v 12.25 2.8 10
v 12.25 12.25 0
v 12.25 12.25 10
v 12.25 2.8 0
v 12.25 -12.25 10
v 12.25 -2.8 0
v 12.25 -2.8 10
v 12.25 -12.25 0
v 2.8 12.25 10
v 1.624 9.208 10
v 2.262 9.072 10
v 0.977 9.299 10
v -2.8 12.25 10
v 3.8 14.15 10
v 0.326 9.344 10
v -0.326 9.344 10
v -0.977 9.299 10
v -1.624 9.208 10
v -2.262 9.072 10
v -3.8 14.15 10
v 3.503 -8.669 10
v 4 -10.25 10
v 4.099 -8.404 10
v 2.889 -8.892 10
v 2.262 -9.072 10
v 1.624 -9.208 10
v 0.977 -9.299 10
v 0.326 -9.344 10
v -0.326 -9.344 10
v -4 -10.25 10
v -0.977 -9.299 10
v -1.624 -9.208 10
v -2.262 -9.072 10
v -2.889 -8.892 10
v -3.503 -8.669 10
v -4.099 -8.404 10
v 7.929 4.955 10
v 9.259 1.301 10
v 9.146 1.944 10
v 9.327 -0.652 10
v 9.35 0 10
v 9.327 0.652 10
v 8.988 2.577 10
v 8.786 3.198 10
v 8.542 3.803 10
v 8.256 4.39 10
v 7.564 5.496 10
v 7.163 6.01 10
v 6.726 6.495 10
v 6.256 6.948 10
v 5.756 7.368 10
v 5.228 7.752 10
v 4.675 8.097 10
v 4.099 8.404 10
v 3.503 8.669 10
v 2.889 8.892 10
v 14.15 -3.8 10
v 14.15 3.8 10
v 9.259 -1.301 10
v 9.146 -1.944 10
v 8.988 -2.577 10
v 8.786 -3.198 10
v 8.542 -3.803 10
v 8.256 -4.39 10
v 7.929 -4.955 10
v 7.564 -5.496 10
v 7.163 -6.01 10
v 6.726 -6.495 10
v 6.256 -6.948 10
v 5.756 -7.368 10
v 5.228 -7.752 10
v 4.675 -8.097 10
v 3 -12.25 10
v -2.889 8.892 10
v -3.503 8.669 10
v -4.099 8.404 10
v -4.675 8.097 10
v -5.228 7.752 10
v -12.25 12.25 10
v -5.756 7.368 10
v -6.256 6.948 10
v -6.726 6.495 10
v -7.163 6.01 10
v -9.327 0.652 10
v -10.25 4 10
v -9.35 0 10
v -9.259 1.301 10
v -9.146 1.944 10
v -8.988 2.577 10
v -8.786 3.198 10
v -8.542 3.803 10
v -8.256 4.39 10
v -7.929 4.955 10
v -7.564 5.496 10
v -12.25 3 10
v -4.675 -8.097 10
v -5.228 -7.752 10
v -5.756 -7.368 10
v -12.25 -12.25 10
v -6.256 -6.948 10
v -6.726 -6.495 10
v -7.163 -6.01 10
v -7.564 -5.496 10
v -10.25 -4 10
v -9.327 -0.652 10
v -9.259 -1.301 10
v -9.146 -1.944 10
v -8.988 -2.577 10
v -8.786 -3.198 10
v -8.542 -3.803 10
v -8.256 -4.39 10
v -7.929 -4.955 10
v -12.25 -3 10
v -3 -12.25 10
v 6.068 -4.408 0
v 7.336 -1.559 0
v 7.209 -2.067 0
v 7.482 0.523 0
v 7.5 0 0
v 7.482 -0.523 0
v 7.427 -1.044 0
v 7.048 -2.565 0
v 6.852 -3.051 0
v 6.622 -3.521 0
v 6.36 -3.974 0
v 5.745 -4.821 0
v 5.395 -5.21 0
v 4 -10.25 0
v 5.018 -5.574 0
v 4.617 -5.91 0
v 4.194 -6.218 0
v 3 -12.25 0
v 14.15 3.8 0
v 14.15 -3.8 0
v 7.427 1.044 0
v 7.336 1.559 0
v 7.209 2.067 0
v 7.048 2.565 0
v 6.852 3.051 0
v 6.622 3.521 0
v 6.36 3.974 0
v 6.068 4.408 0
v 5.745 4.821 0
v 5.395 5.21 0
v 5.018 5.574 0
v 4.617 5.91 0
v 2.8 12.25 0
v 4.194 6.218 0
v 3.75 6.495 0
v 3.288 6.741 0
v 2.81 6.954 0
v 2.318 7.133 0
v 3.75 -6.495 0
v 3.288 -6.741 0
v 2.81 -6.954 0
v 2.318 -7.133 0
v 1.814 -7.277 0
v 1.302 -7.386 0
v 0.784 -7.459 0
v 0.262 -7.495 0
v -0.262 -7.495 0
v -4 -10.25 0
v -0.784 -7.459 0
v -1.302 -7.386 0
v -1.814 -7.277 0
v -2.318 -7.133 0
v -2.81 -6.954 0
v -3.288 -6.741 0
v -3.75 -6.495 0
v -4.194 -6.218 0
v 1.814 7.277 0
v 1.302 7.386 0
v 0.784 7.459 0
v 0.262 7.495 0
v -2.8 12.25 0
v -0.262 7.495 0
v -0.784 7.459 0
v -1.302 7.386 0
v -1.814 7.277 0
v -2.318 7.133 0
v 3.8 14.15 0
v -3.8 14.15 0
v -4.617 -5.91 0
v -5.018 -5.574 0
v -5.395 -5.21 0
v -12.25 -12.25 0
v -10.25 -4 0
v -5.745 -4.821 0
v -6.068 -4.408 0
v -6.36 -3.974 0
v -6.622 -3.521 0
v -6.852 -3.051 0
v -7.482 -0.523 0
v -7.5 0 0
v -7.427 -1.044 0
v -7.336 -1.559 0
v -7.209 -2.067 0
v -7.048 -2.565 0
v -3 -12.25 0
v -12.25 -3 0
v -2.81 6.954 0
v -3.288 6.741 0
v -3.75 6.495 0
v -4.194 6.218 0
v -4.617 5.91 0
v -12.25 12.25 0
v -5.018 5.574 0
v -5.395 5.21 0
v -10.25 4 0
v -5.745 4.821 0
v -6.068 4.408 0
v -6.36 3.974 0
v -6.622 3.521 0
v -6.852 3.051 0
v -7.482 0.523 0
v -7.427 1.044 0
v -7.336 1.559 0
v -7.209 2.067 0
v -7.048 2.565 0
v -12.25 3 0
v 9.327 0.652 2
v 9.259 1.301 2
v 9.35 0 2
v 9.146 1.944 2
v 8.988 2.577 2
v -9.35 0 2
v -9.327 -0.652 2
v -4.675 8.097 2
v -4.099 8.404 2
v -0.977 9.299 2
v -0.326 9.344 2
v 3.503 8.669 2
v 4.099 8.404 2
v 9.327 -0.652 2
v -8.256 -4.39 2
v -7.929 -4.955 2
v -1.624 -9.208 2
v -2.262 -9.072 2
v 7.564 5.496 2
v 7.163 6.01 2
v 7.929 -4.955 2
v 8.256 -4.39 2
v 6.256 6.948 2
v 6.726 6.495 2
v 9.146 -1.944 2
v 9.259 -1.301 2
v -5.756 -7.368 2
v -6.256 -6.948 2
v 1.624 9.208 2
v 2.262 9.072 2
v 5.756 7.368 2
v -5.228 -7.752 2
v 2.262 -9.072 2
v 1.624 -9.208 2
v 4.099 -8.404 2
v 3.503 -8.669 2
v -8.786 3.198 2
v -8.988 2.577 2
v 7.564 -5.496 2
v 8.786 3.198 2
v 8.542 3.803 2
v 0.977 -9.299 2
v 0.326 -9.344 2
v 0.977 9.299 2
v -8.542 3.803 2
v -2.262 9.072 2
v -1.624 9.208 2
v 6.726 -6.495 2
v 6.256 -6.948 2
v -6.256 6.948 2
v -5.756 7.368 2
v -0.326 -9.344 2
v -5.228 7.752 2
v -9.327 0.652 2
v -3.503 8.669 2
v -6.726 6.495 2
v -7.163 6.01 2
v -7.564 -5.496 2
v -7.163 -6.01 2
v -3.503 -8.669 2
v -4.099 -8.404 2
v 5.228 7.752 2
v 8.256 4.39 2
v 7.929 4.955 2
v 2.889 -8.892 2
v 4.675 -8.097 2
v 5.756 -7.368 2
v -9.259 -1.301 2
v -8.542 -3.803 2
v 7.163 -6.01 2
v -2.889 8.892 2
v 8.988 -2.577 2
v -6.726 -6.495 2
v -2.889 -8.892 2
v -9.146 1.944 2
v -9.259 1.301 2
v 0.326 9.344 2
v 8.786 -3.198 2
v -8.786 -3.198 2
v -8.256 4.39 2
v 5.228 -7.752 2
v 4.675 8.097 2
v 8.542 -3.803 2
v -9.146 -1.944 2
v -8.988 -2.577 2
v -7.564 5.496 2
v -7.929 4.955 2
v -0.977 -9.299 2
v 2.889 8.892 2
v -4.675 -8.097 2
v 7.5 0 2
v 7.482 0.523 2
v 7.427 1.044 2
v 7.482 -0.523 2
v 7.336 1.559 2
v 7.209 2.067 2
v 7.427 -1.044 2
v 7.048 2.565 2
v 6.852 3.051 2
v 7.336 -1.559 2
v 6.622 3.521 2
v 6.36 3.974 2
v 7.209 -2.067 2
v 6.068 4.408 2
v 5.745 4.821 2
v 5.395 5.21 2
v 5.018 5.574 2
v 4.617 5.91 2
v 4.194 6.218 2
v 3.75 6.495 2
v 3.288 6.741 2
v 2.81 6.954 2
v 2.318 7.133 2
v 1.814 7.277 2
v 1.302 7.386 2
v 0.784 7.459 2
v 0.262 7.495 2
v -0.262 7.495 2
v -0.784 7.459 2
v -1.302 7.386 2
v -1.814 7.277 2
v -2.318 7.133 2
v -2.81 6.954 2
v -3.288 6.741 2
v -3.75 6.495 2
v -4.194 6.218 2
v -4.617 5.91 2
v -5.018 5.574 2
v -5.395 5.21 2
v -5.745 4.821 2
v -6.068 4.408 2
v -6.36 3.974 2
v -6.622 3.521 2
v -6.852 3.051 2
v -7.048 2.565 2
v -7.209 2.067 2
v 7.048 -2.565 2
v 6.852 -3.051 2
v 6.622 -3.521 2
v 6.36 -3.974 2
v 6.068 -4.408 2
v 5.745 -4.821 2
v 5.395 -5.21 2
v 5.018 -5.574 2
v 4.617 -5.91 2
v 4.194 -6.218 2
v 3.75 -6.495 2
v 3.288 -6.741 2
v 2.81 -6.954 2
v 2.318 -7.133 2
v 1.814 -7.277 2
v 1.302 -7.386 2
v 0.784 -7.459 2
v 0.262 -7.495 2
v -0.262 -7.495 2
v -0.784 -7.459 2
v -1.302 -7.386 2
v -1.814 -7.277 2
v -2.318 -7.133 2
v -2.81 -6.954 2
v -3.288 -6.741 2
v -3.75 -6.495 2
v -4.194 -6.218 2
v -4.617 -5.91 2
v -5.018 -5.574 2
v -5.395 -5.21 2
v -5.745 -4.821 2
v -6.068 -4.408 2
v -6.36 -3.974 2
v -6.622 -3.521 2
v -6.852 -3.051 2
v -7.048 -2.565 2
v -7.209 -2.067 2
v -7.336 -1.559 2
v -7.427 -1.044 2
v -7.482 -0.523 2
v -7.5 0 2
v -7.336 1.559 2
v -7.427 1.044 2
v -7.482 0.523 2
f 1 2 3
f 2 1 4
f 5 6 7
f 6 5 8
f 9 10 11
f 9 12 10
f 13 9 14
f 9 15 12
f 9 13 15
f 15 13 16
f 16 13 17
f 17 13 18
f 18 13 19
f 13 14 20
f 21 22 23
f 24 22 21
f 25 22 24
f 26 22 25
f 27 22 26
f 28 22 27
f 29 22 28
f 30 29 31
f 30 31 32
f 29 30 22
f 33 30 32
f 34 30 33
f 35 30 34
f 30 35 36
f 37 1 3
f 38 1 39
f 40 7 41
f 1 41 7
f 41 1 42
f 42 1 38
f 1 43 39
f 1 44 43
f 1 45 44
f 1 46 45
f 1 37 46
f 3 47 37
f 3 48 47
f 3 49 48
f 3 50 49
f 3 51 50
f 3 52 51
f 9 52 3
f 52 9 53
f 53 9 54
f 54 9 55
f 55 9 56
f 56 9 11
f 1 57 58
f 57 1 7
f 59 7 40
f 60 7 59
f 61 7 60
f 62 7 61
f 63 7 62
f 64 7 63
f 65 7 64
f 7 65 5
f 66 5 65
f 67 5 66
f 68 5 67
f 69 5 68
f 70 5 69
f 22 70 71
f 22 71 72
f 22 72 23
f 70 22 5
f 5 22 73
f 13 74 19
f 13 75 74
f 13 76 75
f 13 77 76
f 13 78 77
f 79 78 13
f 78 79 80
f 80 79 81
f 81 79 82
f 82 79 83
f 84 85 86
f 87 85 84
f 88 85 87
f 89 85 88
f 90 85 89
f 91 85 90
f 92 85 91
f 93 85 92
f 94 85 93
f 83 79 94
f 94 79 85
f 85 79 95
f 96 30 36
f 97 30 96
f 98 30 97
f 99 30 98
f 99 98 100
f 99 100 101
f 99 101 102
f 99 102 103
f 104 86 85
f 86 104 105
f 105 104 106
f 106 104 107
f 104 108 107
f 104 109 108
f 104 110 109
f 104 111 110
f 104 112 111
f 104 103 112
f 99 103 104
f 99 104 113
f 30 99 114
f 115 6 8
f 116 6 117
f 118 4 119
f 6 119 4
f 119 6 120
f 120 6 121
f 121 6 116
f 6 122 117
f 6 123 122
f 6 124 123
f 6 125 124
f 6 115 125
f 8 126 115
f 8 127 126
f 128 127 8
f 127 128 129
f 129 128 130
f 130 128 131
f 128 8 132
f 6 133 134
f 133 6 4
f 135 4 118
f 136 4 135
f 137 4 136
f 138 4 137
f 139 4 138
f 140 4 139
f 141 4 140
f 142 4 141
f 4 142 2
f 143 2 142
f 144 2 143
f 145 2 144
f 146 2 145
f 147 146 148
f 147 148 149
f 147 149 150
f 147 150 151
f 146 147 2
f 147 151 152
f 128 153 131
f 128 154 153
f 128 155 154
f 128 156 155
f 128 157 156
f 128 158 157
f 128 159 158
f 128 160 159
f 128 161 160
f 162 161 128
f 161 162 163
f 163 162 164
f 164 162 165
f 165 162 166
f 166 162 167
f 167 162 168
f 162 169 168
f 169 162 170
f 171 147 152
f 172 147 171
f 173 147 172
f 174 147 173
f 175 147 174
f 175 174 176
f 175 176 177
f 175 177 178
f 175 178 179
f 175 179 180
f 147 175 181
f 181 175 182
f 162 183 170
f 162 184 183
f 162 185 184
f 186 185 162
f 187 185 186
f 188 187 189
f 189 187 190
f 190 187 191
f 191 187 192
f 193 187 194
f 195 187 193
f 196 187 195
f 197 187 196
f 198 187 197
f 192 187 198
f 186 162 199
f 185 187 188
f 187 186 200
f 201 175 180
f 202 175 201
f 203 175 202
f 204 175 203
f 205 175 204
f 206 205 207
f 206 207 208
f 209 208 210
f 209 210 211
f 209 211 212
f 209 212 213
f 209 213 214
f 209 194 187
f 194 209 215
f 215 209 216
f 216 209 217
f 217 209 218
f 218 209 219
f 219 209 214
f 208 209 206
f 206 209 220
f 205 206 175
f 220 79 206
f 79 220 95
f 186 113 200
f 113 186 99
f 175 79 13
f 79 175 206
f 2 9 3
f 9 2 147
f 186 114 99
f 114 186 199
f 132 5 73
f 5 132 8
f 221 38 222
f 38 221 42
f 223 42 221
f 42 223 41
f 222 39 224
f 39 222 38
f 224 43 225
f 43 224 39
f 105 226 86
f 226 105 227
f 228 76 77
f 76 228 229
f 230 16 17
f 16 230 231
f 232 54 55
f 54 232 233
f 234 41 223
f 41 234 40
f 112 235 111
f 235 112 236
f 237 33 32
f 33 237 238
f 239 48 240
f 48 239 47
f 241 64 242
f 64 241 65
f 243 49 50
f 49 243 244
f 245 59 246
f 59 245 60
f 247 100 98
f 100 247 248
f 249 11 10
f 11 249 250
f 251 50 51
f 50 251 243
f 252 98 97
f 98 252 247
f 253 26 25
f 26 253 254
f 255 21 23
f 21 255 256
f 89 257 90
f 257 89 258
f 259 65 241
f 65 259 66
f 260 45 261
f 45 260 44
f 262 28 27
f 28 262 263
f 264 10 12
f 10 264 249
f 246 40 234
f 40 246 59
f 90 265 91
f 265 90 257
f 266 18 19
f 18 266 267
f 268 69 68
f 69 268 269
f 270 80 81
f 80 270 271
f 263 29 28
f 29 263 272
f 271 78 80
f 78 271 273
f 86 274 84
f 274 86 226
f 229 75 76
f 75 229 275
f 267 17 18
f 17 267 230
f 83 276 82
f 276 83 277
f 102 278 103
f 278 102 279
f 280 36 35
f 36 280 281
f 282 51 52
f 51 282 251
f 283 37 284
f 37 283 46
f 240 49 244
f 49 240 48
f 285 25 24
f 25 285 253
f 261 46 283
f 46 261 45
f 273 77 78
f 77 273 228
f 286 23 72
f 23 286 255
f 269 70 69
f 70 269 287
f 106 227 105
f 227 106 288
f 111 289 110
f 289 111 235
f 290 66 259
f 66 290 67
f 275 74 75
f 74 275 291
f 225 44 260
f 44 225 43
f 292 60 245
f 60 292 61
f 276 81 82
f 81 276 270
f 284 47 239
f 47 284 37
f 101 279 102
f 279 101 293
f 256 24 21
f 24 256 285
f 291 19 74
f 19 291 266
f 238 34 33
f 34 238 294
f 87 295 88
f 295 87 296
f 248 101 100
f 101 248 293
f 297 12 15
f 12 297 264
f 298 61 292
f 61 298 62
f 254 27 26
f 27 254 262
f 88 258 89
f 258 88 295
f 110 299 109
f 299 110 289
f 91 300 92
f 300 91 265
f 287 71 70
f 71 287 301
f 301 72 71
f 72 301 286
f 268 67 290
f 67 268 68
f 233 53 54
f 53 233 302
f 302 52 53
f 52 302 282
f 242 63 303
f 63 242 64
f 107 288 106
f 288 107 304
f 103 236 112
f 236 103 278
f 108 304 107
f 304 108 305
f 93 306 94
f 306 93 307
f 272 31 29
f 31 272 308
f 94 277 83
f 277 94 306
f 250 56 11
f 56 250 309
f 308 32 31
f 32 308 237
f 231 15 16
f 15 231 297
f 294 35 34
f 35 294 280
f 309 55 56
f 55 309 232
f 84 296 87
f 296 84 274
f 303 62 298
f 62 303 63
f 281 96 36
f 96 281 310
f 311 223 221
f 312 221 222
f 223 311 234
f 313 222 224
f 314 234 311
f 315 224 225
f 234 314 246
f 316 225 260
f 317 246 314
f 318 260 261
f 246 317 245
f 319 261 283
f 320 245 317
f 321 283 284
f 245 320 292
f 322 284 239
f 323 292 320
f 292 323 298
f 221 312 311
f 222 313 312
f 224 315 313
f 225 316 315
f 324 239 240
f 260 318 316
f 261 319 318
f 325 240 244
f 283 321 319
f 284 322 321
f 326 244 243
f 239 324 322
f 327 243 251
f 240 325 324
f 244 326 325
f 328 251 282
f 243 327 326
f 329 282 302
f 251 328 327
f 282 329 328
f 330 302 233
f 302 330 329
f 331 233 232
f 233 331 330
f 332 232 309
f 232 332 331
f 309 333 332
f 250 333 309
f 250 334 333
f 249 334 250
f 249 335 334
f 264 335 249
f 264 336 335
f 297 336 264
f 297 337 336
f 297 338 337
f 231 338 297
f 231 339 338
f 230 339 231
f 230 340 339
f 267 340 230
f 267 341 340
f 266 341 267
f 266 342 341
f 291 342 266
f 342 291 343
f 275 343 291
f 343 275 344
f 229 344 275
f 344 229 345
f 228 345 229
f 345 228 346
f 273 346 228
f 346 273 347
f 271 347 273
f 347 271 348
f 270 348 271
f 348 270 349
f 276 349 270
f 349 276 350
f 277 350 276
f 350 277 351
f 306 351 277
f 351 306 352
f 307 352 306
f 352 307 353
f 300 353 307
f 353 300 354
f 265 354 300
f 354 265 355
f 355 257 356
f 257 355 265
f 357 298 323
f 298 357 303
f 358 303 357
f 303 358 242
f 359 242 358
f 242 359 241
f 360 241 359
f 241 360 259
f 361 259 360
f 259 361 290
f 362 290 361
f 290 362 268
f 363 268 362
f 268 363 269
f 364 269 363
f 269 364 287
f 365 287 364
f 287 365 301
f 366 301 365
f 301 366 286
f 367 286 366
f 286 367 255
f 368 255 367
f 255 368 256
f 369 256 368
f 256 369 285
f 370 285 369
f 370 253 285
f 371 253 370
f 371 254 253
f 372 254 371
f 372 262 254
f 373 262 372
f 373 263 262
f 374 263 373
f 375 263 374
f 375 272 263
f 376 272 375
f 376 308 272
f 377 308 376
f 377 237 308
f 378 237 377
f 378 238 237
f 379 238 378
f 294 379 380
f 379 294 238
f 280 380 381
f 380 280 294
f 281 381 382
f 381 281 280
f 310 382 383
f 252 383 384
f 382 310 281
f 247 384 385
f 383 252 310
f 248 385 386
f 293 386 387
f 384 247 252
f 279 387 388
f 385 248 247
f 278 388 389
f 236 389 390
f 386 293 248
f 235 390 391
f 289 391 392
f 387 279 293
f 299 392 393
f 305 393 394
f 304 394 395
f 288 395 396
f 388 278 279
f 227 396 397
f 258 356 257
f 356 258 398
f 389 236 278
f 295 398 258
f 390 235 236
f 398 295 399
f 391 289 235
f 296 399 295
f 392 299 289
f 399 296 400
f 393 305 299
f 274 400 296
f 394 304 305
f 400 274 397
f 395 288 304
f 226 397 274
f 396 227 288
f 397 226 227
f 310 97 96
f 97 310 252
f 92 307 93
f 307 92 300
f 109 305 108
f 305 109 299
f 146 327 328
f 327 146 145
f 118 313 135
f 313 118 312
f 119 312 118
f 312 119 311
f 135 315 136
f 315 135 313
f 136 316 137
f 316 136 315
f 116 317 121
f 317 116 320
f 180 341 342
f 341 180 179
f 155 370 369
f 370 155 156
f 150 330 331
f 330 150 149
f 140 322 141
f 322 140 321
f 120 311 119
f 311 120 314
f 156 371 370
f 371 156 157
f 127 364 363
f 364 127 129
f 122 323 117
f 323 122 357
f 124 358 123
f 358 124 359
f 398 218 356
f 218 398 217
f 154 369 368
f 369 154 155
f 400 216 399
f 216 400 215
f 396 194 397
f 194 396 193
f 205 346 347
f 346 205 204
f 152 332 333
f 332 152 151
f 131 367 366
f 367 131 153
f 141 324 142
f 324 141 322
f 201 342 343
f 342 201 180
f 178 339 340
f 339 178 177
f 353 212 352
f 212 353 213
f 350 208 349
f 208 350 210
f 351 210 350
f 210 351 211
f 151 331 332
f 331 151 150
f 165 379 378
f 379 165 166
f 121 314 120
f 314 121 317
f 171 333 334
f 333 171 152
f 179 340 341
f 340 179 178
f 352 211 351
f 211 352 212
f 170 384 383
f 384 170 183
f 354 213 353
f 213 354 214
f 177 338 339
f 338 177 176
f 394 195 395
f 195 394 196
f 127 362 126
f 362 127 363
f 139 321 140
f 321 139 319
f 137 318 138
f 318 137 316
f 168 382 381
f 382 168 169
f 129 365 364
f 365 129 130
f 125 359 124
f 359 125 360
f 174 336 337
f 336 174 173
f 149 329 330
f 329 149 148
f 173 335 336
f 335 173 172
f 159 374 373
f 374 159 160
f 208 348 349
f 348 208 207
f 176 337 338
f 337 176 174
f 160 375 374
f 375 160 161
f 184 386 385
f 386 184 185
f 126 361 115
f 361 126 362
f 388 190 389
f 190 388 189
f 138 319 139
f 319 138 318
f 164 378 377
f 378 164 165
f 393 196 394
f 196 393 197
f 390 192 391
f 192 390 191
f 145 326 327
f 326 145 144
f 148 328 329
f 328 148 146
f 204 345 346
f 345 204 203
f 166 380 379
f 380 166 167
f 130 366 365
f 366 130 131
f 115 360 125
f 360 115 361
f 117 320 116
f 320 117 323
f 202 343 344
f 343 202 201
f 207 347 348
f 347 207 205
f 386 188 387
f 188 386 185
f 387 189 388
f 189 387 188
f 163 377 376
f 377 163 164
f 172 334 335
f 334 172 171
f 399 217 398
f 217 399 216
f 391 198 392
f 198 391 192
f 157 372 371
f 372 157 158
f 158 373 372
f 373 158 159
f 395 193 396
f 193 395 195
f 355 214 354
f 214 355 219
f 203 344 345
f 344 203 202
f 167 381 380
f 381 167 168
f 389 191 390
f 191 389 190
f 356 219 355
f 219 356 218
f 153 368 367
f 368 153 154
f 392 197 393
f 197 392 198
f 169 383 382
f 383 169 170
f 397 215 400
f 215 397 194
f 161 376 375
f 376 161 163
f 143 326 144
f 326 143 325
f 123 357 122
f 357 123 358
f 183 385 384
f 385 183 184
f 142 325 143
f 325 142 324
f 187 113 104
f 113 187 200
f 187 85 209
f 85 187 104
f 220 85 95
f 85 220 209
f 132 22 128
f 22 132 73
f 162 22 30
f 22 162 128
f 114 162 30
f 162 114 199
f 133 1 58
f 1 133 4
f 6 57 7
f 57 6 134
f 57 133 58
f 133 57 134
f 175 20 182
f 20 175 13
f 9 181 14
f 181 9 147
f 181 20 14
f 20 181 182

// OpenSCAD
$inner_diameter = 18.5/2; //Radius of batter wall (mm)

$battery_offset = 1;

$endcap_height = 10;

$endcap_width = 3;

$number_of_batteries = 1;

$tolerence = 0.2;

$endcap_top = 1;

$peg_width = 4;

//$number_of_fragents = 45;
$number_of_fragents = 90;

module reference_battery($fn = $number_of_fragents) {
    // reference stethoscope head as it was too complex to load into memory
    cylinder(h = 65, r = $inner_diameter);

}

module keyway(width, height, waist, depth){
    // keyway is code to handle making a keyway to easily switch out addons

//    rotate(a = 90, v = [0, 1, 0]){
        linear_extrude(height = depth, center = true)
        polygon(points = [
                [-width/2, -height/2],
                [0, -waist/2],
                [width/2, -height/2],
                [width/2, height/2],
                [0, waist/2],
                [-width/2, height/2]]
        );
//    }
}


module connector(width) {

//    cube([width, width, $endcap_height], center = true);
    keyway(width, 2*width, 2*width-2, $endcap_height);
}

module cap($fn = $number_of_fragents) {

    translate(v = [($inner_diameter + $endcap_width), 0, $endcap_height/2]){
        connector($peg_width - $tolerence);
    }

    rotate([0, 0, 90]) {
        translate(v = [($inner_diameter + $endcap_width), 0, $endcap_height/2]){
            connector($peg_width - $tolerence);
        }
    }

    // the cap itself

    difference() {
      difference() {
          difference() {
              translate(v = [0, 0, $endcap_height/2]){
                  cube([2*($inner_diameter + $endcap_width), 2*($inner_diameter + $endcap_width), $endcap_height], center = true);
              }

              translate(v = [0, 0, $endcap_top*2]){
                  cylinder(h = $endcap_height*3, r =  $inner_diameter + $tolerence/2);
              }
          }

  //        translate(v = [0, 0, $endcap_top]){
              cylinder(h = $endcap_height*3, r =  $inner_diameter*0.8 + $tolerence/2);
  //        }
       }

      union() {

        rotate([0, 0, 180]) {
          translate(v = [($inner_diameter + $endcap_width), 0, $endcap_height/2]){
            connector($peg_width);
          }
        }

        rotate([0, 0, 270]) {
          translate(v = [($inner_diameter + $endcap_width), 0, $endcap_height/2]){
            connector($peg_width);
          }
        }
      }
    }
}


for (a =[0:1:$number_of_batteries - 1]){
    echo(a);
    translate(v = [a*($inner_diameter*2 + $endcap_width*2 + $tolerence), 0, 0]){

//        reference_battery();
        cap();
    }
}
